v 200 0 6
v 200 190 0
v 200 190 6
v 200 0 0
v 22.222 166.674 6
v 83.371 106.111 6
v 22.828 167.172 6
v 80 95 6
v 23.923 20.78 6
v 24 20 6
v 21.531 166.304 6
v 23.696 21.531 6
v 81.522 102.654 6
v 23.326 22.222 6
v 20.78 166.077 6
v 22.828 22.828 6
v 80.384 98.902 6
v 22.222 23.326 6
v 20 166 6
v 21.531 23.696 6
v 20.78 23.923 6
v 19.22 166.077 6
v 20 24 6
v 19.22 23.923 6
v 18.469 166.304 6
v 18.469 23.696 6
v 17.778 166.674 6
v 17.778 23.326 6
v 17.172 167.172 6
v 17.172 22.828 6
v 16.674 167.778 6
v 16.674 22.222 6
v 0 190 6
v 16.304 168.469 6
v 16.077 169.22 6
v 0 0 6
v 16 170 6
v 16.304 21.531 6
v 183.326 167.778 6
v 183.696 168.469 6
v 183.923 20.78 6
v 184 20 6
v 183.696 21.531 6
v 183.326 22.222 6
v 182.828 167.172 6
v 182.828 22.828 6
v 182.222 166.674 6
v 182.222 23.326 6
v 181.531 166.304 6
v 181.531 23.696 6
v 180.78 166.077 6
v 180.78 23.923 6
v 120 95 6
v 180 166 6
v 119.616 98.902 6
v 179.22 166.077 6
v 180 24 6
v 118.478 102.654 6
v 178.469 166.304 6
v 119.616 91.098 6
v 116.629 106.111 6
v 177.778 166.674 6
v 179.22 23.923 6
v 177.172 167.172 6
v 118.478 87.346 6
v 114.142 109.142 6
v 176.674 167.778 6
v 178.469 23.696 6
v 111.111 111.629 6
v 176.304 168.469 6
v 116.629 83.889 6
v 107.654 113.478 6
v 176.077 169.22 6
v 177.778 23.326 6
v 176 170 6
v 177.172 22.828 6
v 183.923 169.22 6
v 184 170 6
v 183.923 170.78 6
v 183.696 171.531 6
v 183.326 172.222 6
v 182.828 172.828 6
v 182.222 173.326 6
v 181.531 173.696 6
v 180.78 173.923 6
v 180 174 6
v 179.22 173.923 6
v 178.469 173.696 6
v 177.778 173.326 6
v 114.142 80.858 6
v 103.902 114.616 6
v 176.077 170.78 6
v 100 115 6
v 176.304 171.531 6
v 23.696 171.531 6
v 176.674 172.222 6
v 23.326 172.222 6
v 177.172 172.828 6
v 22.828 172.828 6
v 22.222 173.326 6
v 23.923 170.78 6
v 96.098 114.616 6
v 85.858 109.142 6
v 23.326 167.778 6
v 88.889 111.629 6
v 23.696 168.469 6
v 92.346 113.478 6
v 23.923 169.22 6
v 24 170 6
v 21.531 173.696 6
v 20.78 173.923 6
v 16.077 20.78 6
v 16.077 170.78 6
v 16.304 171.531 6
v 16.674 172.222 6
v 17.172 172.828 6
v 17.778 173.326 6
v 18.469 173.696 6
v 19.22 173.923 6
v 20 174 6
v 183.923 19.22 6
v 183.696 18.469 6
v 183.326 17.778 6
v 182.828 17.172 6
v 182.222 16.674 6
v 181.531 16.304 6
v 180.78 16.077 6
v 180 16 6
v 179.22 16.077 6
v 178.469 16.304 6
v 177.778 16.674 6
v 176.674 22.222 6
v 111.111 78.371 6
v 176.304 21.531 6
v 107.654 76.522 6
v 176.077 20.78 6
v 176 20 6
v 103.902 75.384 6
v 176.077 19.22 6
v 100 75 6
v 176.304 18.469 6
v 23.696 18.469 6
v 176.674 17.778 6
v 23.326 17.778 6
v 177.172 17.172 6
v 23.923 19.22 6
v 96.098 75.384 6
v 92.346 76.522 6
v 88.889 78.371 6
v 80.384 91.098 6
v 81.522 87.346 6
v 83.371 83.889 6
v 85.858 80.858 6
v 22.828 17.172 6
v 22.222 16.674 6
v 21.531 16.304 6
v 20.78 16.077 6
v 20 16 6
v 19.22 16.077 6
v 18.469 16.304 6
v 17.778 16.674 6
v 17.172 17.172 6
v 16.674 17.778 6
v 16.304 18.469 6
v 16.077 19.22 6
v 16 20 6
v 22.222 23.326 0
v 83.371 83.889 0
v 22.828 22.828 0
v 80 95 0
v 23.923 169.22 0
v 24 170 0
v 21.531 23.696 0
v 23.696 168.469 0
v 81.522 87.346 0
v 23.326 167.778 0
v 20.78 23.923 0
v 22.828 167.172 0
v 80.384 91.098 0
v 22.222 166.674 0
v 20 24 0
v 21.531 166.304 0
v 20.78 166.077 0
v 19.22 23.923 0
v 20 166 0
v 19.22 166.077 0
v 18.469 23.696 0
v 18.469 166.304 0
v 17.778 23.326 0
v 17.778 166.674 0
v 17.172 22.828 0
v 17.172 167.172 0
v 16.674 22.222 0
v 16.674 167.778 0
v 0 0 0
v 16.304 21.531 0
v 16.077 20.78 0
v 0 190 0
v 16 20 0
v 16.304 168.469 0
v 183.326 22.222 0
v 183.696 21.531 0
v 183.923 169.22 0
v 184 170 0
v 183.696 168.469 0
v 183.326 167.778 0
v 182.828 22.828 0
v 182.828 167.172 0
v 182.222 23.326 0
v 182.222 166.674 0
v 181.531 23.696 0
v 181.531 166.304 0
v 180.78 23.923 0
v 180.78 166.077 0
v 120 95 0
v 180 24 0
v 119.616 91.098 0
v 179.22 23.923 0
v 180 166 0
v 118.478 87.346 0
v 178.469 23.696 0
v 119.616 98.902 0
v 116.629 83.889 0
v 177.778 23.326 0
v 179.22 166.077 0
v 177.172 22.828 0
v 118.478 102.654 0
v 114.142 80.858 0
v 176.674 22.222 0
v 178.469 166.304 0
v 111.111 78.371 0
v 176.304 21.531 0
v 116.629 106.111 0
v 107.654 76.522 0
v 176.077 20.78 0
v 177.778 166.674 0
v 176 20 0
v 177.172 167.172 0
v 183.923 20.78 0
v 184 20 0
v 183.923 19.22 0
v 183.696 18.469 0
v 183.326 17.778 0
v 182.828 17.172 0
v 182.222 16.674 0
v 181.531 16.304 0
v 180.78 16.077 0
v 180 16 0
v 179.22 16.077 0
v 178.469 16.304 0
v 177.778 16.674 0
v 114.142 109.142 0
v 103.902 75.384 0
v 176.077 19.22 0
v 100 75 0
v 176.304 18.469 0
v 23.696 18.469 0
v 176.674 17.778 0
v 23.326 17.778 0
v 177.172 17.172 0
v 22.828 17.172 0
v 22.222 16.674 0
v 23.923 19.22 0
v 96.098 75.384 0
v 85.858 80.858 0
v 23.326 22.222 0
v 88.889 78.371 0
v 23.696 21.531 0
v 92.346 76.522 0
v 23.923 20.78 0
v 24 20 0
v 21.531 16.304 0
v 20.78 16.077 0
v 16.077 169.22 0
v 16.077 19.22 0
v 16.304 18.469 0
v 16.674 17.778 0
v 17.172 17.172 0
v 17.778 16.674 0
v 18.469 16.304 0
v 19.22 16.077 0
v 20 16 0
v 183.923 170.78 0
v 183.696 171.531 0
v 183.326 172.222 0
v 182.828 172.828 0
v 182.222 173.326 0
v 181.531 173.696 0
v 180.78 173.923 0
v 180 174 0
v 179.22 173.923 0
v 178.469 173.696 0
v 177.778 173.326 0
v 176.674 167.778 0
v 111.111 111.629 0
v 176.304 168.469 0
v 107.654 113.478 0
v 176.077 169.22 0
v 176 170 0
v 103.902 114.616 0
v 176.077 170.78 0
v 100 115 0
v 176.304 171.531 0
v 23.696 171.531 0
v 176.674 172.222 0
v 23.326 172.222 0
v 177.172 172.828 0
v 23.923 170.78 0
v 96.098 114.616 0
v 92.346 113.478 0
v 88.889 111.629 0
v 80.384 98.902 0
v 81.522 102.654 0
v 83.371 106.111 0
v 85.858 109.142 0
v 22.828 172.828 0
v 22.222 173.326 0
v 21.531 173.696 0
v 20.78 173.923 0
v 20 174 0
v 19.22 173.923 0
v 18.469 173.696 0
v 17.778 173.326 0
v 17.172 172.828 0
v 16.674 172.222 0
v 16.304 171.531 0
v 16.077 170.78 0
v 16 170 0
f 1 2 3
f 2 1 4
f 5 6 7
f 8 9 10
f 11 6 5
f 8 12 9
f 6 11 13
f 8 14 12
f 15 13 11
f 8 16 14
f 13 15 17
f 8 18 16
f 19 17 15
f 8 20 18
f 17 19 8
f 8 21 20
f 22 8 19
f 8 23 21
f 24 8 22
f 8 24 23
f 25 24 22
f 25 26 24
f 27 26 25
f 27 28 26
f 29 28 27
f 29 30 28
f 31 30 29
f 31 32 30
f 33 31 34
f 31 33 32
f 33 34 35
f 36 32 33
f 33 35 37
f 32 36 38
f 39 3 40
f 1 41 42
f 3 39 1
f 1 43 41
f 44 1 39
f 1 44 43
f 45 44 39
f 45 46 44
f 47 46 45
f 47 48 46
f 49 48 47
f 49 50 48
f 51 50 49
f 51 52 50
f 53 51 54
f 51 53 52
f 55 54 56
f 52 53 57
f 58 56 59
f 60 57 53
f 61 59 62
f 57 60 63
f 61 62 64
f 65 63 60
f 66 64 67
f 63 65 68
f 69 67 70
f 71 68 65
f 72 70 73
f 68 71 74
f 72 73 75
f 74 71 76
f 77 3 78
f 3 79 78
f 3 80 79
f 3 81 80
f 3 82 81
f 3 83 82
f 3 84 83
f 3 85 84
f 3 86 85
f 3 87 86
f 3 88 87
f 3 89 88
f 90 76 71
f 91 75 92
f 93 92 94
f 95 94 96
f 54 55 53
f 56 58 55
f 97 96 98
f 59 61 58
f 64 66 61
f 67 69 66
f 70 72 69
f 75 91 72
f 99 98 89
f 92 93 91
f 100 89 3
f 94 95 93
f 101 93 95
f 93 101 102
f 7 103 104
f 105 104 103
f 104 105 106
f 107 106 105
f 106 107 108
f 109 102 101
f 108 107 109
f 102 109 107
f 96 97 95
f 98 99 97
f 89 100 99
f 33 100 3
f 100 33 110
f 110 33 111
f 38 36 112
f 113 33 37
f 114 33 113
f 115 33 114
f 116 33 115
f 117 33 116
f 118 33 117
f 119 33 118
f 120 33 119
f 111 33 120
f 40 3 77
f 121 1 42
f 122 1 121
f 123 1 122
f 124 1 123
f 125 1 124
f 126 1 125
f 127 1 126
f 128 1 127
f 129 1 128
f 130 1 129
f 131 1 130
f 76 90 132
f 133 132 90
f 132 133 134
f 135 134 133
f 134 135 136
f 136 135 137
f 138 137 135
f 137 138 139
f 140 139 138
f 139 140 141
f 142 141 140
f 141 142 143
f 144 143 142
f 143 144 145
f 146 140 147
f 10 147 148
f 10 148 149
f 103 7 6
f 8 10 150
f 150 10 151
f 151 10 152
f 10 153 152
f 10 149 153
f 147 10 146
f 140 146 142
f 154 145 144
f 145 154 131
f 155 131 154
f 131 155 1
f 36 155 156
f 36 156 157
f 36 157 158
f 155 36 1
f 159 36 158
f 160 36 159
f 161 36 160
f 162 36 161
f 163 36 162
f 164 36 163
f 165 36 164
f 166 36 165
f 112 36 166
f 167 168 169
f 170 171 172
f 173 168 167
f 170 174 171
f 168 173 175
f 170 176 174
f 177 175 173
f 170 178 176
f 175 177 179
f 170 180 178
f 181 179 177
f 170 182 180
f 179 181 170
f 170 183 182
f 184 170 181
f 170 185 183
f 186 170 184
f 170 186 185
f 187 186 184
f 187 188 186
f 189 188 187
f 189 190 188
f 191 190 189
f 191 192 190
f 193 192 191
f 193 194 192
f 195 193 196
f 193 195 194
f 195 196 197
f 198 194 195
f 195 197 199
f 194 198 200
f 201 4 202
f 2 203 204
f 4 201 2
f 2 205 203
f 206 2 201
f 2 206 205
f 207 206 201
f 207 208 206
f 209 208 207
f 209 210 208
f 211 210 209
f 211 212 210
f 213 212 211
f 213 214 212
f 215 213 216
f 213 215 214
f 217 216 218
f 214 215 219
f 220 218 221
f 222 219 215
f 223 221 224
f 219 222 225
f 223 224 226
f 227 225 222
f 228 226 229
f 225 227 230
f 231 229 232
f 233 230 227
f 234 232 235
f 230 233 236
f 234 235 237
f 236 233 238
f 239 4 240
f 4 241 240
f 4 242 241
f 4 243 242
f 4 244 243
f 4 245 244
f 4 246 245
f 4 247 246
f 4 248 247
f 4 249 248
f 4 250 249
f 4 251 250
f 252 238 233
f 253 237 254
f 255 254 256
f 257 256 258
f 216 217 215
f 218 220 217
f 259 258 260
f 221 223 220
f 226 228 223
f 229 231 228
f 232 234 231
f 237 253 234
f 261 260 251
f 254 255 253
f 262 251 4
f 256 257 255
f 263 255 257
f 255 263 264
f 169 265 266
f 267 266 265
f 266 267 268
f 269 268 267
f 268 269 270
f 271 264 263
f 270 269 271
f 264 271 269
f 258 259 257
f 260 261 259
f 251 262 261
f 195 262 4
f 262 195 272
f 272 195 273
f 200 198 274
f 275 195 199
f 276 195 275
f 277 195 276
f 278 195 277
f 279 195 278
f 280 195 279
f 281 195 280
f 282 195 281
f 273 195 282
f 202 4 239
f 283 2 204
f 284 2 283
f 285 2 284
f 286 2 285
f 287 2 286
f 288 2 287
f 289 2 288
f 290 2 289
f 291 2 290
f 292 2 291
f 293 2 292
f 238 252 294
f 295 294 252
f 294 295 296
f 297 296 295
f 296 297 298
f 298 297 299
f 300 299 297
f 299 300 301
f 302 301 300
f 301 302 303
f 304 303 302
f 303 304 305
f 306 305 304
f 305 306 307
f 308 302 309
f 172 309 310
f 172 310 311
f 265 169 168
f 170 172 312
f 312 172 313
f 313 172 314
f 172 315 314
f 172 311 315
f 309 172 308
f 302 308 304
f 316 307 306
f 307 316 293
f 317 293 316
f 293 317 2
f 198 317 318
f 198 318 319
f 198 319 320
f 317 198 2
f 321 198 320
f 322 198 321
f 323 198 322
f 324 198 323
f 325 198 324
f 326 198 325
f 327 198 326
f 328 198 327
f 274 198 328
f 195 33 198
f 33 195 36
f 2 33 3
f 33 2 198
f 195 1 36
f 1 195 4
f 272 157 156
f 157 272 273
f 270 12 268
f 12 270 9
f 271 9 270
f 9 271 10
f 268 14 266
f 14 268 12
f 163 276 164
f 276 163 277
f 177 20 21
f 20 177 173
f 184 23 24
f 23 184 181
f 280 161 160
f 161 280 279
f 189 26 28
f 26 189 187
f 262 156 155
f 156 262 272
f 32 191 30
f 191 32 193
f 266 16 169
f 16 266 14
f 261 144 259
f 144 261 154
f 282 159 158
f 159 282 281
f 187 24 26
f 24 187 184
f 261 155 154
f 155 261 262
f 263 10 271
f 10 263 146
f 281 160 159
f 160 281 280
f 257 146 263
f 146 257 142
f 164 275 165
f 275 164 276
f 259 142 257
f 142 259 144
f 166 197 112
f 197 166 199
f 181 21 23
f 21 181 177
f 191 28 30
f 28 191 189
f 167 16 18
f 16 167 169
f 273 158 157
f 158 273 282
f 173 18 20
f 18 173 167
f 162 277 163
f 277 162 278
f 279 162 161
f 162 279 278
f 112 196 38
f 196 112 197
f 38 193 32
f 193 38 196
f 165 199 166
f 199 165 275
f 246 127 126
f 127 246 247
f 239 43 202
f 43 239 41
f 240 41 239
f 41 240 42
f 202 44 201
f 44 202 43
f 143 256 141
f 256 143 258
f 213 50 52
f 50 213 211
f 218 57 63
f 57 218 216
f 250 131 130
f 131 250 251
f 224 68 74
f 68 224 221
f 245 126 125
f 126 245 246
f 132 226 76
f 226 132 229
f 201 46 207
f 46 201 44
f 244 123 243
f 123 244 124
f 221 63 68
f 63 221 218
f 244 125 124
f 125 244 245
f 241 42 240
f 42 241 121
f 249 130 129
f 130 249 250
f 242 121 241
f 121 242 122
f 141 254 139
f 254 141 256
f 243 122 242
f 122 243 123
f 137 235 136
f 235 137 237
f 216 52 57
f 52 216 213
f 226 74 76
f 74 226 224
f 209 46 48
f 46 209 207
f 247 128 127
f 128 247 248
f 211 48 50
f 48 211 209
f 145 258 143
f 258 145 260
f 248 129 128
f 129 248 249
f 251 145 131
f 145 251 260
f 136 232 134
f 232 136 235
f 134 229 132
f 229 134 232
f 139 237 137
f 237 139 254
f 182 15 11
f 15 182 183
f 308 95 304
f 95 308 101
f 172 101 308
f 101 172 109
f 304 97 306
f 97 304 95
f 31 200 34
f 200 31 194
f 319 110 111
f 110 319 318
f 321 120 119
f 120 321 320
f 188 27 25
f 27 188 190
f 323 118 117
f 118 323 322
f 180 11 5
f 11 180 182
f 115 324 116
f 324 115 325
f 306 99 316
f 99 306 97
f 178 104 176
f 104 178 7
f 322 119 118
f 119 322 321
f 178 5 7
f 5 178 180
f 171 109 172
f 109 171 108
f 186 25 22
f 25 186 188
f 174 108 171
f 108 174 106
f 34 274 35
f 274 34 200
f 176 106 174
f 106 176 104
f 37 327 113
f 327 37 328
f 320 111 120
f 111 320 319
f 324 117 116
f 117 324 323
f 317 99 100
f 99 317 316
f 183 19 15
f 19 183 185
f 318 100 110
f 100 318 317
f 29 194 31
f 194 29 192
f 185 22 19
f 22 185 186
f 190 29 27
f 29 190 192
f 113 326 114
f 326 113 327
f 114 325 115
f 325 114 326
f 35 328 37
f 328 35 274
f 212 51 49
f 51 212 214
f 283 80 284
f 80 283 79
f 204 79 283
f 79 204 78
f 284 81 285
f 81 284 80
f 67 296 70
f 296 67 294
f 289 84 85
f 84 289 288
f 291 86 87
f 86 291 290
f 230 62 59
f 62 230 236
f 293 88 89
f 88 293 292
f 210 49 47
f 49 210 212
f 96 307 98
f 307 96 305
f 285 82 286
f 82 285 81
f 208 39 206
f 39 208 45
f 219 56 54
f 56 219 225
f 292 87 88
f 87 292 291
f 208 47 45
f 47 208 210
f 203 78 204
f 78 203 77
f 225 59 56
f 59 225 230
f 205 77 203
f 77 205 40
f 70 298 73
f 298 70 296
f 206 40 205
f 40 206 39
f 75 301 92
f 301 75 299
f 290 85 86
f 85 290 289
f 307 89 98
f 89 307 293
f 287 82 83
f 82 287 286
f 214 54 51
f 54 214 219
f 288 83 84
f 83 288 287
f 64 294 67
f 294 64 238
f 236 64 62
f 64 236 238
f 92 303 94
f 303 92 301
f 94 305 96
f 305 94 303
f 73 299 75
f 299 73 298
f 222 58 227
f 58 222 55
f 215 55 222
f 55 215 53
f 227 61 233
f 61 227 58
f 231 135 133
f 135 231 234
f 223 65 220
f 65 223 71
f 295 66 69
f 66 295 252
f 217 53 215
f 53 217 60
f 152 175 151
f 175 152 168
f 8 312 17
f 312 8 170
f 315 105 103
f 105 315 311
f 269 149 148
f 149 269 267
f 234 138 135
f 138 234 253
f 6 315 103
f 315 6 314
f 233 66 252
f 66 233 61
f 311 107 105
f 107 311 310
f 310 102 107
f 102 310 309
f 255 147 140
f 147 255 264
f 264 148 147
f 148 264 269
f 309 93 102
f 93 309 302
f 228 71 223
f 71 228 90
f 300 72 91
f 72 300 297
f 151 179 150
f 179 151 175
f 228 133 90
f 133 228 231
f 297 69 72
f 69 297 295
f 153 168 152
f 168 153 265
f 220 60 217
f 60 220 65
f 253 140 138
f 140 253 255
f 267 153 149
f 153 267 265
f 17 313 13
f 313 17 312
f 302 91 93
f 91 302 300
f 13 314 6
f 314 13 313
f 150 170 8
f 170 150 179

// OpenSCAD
$fn = 32;

// ----------------------------------------------------------------------
// Big plate: 200-250 mm adapter plate
// ----------------------------------------------------------------------

// --- parameters (mm) ---
plate_l = 200;            // plate length, X
plate_w = 190;            // plate width, Y
plate_t = 6;              // plate thickness, Z
corner_d = 8;             // corner hole diameter
corner_in = 20;           // corner hole inset from the edges
bore_d = 40;              // central bore

difference() {
  cube([plate_l, plate_w, plate_t]);
  translate([corner_in, corner_in, -1]) cylinder(h = plate_t + 2, d = corner_d);
  translate([plate_l - corner_in, corner_in, -1]) cylinder(h = plate_t + 2, d = corner_d);
  translate([corner_in, plate_w - corner_in, -1]) cylinder(h = plate_t + 2, d = corner_d);
  translate([plate_l - corner_in, plate_w - corner_in, -1]) cylinder(h = plate_t + 2, d = corner_d);
  translate([plate_l / 2, plate_w / 2, -1]) cylinder(h = plate_t + 2, d = bore_d);
}
